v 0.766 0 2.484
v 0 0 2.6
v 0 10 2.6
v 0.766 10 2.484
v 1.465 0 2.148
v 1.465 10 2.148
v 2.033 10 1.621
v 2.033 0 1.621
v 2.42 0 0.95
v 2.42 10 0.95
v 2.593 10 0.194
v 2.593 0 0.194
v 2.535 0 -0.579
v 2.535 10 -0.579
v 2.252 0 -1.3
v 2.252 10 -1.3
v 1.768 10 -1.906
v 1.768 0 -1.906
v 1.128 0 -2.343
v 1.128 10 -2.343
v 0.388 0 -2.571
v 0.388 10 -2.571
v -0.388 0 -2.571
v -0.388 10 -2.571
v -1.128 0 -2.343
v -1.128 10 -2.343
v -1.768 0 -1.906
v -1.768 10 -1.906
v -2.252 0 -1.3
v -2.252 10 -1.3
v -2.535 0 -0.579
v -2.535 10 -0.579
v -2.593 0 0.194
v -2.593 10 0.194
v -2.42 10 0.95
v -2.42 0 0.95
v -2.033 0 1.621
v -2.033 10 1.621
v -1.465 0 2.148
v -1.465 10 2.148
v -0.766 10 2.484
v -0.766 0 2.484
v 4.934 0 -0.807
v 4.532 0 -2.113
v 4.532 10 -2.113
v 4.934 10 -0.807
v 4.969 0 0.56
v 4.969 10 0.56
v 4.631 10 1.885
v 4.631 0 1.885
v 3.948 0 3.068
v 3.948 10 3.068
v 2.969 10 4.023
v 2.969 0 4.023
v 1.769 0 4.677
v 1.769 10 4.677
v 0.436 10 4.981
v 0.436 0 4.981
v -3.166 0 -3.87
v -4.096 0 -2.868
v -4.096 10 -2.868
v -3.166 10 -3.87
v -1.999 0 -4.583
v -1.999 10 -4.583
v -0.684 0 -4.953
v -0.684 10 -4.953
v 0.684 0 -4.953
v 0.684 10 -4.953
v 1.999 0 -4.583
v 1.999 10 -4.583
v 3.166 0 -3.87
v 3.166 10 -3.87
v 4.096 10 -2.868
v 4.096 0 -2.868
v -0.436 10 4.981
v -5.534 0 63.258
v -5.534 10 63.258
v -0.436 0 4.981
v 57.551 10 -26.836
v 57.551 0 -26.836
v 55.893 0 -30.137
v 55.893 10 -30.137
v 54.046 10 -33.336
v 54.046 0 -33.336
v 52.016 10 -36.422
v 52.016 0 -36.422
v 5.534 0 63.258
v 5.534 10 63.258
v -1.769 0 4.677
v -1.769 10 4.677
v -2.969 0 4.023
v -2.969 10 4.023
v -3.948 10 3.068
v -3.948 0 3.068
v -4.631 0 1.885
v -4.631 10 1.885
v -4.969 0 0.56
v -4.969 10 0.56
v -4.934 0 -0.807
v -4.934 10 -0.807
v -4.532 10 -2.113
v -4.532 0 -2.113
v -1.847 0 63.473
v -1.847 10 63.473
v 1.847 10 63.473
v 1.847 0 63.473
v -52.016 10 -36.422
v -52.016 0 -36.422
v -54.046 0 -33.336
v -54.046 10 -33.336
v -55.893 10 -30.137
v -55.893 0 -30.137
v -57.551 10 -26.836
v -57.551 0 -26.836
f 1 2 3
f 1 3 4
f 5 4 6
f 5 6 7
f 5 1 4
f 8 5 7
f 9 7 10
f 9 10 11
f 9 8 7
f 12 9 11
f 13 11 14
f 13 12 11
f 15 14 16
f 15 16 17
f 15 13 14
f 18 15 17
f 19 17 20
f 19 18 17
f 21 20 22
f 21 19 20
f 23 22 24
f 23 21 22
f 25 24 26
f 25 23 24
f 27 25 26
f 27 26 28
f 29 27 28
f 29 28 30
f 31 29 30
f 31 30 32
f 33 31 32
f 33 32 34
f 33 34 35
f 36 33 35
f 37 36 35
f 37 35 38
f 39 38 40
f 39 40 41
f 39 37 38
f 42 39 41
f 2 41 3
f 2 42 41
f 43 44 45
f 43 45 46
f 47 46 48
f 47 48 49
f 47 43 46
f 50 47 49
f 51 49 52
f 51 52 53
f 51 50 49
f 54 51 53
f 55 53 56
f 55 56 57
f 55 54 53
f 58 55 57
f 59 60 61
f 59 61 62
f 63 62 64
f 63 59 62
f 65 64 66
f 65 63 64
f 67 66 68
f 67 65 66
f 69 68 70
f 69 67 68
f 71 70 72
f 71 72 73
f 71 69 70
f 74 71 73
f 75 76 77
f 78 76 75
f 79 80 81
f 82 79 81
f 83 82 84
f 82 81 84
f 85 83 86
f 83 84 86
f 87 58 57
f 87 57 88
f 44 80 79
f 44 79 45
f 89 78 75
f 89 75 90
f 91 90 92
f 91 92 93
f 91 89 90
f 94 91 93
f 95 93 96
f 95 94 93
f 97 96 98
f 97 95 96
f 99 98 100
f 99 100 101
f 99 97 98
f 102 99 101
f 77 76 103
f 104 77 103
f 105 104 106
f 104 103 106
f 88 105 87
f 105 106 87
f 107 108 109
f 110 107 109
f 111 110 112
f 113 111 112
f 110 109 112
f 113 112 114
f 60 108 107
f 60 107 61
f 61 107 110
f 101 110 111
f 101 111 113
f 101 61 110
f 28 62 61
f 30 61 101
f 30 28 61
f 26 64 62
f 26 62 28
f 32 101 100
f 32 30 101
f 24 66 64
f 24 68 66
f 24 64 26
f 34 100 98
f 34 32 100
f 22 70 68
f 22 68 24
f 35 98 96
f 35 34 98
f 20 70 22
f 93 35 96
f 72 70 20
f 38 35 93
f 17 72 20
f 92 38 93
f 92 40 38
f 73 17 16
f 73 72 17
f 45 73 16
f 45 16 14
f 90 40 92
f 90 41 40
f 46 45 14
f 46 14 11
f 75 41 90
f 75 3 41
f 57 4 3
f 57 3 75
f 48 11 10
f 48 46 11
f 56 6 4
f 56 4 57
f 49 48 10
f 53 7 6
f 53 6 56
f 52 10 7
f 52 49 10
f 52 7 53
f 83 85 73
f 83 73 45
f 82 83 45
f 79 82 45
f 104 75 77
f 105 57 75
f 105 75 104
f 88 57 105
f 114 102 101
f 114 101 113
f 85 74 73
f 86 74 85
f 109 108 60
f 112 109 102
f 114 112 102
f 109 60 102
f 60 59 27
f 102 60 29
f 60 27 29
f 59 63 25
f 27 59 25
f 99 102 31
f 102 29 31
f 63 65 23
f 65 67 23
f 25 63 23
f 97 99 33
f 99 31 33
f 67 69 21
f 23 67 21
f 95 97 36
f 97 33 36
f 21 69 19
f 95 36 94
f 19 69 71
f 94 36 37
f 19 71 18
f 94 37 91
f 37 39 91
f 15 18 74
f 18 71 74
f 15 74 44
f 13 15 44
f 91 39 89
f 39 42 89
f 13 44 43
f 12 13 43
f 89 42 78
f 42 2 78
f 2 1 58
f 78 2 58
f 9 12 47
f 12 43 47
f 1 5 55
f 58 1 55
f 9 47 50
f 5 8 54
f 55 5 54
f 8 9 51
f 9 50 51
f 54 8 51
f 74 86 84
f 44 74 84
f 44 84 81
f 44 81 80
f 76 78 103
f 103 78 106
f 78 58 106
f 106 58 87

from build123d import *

# Parameters (mm, degrees)
SKETCH1_R           = 63.5
SKETCH1_R_2         = 2.6
BOSS_EXTRUDE1_DEPTH = 10
CUT_EXTRUDE1_START  = -10
CUT_EXTRUDE1_DEPTH  = 10


with BuildPart() as part:
    # Sketch1 → Boss-Extrude1 (new body)
    with BuildSketch(Plane(origin=(0, 0, 0), x_dir=(1, 0, 0), z_dir=(0, 1, 0))):
        with Locations(Location((0, 0, 0), (0, 0, 270))):
            Circle(SKETCH1_R)
        with Locations(Location((0, 0, 0), (0, 0, 270))):
            Circle(SKETCH1_R_2, mode=Mode.SUBTRACT)
    extrude(amount=BOSS_EXTRUDE1_DEPTH)

    # Sketch2 → Cut-Extrude1 (cut)
    with BuildSketch(Plane(origin=(0, 10, 0), x_dir=(1, 0, 0), z_dir=(0, 1, 0)).offset(CUT_EXTRUDE1_START)):
        with BuildLine():
            ThreePointArc((4.531538935, 2.113091309), (4.330127019, -2.5), (0.435778714, -4.98097349))
            Line((0.435778714, -4.98097349), (5.534389664, -63.258363329))
            ThreePointArc((5.534389664, -63.258363329), (54.99261314, -31.75), (57.550544477, 26.836259621))
            Line((57.550544477, 26.836259621), (4.531538935, 2.113091309))
        make_face()
        with BuildLine():
            Line((-5.534389664, -63.258363329), (-0.435778714, -4.98097349))
            ThreePointArc((-0.435778714, -4.98097349), (-4.330127019, -2.5), (-4.531538935, 2.113091309))
            Line((-4.531538935, 2.113091309), (-57.550544477, 26.836259621))
            ThreePointArc((-57.550544477, 26.836259621), (-54.99261314, -31.75), (-5.534389664, -63.258363329))
        make_face()
        with BuildLine():
            Line((-52.016154812, 36.422103708), (-4.095760221, 2.867882182))
            ThreePointArc((-4.095760221, 2.867882182), (0, 5), (4.095760221, 2.867882182))
            Line((4.095760221, 2.867882182), (52.016154812, 36.422103708))
            ThreePointArc((52.016154812, 36.422103708), (0, 63.5), (-52.016154812, 36.422103708))
        make_face()
    extrude(amount=CUT_EXTRUDE1_DEPTH, mode=Mode.SUBTRACT)


solid = part.part
